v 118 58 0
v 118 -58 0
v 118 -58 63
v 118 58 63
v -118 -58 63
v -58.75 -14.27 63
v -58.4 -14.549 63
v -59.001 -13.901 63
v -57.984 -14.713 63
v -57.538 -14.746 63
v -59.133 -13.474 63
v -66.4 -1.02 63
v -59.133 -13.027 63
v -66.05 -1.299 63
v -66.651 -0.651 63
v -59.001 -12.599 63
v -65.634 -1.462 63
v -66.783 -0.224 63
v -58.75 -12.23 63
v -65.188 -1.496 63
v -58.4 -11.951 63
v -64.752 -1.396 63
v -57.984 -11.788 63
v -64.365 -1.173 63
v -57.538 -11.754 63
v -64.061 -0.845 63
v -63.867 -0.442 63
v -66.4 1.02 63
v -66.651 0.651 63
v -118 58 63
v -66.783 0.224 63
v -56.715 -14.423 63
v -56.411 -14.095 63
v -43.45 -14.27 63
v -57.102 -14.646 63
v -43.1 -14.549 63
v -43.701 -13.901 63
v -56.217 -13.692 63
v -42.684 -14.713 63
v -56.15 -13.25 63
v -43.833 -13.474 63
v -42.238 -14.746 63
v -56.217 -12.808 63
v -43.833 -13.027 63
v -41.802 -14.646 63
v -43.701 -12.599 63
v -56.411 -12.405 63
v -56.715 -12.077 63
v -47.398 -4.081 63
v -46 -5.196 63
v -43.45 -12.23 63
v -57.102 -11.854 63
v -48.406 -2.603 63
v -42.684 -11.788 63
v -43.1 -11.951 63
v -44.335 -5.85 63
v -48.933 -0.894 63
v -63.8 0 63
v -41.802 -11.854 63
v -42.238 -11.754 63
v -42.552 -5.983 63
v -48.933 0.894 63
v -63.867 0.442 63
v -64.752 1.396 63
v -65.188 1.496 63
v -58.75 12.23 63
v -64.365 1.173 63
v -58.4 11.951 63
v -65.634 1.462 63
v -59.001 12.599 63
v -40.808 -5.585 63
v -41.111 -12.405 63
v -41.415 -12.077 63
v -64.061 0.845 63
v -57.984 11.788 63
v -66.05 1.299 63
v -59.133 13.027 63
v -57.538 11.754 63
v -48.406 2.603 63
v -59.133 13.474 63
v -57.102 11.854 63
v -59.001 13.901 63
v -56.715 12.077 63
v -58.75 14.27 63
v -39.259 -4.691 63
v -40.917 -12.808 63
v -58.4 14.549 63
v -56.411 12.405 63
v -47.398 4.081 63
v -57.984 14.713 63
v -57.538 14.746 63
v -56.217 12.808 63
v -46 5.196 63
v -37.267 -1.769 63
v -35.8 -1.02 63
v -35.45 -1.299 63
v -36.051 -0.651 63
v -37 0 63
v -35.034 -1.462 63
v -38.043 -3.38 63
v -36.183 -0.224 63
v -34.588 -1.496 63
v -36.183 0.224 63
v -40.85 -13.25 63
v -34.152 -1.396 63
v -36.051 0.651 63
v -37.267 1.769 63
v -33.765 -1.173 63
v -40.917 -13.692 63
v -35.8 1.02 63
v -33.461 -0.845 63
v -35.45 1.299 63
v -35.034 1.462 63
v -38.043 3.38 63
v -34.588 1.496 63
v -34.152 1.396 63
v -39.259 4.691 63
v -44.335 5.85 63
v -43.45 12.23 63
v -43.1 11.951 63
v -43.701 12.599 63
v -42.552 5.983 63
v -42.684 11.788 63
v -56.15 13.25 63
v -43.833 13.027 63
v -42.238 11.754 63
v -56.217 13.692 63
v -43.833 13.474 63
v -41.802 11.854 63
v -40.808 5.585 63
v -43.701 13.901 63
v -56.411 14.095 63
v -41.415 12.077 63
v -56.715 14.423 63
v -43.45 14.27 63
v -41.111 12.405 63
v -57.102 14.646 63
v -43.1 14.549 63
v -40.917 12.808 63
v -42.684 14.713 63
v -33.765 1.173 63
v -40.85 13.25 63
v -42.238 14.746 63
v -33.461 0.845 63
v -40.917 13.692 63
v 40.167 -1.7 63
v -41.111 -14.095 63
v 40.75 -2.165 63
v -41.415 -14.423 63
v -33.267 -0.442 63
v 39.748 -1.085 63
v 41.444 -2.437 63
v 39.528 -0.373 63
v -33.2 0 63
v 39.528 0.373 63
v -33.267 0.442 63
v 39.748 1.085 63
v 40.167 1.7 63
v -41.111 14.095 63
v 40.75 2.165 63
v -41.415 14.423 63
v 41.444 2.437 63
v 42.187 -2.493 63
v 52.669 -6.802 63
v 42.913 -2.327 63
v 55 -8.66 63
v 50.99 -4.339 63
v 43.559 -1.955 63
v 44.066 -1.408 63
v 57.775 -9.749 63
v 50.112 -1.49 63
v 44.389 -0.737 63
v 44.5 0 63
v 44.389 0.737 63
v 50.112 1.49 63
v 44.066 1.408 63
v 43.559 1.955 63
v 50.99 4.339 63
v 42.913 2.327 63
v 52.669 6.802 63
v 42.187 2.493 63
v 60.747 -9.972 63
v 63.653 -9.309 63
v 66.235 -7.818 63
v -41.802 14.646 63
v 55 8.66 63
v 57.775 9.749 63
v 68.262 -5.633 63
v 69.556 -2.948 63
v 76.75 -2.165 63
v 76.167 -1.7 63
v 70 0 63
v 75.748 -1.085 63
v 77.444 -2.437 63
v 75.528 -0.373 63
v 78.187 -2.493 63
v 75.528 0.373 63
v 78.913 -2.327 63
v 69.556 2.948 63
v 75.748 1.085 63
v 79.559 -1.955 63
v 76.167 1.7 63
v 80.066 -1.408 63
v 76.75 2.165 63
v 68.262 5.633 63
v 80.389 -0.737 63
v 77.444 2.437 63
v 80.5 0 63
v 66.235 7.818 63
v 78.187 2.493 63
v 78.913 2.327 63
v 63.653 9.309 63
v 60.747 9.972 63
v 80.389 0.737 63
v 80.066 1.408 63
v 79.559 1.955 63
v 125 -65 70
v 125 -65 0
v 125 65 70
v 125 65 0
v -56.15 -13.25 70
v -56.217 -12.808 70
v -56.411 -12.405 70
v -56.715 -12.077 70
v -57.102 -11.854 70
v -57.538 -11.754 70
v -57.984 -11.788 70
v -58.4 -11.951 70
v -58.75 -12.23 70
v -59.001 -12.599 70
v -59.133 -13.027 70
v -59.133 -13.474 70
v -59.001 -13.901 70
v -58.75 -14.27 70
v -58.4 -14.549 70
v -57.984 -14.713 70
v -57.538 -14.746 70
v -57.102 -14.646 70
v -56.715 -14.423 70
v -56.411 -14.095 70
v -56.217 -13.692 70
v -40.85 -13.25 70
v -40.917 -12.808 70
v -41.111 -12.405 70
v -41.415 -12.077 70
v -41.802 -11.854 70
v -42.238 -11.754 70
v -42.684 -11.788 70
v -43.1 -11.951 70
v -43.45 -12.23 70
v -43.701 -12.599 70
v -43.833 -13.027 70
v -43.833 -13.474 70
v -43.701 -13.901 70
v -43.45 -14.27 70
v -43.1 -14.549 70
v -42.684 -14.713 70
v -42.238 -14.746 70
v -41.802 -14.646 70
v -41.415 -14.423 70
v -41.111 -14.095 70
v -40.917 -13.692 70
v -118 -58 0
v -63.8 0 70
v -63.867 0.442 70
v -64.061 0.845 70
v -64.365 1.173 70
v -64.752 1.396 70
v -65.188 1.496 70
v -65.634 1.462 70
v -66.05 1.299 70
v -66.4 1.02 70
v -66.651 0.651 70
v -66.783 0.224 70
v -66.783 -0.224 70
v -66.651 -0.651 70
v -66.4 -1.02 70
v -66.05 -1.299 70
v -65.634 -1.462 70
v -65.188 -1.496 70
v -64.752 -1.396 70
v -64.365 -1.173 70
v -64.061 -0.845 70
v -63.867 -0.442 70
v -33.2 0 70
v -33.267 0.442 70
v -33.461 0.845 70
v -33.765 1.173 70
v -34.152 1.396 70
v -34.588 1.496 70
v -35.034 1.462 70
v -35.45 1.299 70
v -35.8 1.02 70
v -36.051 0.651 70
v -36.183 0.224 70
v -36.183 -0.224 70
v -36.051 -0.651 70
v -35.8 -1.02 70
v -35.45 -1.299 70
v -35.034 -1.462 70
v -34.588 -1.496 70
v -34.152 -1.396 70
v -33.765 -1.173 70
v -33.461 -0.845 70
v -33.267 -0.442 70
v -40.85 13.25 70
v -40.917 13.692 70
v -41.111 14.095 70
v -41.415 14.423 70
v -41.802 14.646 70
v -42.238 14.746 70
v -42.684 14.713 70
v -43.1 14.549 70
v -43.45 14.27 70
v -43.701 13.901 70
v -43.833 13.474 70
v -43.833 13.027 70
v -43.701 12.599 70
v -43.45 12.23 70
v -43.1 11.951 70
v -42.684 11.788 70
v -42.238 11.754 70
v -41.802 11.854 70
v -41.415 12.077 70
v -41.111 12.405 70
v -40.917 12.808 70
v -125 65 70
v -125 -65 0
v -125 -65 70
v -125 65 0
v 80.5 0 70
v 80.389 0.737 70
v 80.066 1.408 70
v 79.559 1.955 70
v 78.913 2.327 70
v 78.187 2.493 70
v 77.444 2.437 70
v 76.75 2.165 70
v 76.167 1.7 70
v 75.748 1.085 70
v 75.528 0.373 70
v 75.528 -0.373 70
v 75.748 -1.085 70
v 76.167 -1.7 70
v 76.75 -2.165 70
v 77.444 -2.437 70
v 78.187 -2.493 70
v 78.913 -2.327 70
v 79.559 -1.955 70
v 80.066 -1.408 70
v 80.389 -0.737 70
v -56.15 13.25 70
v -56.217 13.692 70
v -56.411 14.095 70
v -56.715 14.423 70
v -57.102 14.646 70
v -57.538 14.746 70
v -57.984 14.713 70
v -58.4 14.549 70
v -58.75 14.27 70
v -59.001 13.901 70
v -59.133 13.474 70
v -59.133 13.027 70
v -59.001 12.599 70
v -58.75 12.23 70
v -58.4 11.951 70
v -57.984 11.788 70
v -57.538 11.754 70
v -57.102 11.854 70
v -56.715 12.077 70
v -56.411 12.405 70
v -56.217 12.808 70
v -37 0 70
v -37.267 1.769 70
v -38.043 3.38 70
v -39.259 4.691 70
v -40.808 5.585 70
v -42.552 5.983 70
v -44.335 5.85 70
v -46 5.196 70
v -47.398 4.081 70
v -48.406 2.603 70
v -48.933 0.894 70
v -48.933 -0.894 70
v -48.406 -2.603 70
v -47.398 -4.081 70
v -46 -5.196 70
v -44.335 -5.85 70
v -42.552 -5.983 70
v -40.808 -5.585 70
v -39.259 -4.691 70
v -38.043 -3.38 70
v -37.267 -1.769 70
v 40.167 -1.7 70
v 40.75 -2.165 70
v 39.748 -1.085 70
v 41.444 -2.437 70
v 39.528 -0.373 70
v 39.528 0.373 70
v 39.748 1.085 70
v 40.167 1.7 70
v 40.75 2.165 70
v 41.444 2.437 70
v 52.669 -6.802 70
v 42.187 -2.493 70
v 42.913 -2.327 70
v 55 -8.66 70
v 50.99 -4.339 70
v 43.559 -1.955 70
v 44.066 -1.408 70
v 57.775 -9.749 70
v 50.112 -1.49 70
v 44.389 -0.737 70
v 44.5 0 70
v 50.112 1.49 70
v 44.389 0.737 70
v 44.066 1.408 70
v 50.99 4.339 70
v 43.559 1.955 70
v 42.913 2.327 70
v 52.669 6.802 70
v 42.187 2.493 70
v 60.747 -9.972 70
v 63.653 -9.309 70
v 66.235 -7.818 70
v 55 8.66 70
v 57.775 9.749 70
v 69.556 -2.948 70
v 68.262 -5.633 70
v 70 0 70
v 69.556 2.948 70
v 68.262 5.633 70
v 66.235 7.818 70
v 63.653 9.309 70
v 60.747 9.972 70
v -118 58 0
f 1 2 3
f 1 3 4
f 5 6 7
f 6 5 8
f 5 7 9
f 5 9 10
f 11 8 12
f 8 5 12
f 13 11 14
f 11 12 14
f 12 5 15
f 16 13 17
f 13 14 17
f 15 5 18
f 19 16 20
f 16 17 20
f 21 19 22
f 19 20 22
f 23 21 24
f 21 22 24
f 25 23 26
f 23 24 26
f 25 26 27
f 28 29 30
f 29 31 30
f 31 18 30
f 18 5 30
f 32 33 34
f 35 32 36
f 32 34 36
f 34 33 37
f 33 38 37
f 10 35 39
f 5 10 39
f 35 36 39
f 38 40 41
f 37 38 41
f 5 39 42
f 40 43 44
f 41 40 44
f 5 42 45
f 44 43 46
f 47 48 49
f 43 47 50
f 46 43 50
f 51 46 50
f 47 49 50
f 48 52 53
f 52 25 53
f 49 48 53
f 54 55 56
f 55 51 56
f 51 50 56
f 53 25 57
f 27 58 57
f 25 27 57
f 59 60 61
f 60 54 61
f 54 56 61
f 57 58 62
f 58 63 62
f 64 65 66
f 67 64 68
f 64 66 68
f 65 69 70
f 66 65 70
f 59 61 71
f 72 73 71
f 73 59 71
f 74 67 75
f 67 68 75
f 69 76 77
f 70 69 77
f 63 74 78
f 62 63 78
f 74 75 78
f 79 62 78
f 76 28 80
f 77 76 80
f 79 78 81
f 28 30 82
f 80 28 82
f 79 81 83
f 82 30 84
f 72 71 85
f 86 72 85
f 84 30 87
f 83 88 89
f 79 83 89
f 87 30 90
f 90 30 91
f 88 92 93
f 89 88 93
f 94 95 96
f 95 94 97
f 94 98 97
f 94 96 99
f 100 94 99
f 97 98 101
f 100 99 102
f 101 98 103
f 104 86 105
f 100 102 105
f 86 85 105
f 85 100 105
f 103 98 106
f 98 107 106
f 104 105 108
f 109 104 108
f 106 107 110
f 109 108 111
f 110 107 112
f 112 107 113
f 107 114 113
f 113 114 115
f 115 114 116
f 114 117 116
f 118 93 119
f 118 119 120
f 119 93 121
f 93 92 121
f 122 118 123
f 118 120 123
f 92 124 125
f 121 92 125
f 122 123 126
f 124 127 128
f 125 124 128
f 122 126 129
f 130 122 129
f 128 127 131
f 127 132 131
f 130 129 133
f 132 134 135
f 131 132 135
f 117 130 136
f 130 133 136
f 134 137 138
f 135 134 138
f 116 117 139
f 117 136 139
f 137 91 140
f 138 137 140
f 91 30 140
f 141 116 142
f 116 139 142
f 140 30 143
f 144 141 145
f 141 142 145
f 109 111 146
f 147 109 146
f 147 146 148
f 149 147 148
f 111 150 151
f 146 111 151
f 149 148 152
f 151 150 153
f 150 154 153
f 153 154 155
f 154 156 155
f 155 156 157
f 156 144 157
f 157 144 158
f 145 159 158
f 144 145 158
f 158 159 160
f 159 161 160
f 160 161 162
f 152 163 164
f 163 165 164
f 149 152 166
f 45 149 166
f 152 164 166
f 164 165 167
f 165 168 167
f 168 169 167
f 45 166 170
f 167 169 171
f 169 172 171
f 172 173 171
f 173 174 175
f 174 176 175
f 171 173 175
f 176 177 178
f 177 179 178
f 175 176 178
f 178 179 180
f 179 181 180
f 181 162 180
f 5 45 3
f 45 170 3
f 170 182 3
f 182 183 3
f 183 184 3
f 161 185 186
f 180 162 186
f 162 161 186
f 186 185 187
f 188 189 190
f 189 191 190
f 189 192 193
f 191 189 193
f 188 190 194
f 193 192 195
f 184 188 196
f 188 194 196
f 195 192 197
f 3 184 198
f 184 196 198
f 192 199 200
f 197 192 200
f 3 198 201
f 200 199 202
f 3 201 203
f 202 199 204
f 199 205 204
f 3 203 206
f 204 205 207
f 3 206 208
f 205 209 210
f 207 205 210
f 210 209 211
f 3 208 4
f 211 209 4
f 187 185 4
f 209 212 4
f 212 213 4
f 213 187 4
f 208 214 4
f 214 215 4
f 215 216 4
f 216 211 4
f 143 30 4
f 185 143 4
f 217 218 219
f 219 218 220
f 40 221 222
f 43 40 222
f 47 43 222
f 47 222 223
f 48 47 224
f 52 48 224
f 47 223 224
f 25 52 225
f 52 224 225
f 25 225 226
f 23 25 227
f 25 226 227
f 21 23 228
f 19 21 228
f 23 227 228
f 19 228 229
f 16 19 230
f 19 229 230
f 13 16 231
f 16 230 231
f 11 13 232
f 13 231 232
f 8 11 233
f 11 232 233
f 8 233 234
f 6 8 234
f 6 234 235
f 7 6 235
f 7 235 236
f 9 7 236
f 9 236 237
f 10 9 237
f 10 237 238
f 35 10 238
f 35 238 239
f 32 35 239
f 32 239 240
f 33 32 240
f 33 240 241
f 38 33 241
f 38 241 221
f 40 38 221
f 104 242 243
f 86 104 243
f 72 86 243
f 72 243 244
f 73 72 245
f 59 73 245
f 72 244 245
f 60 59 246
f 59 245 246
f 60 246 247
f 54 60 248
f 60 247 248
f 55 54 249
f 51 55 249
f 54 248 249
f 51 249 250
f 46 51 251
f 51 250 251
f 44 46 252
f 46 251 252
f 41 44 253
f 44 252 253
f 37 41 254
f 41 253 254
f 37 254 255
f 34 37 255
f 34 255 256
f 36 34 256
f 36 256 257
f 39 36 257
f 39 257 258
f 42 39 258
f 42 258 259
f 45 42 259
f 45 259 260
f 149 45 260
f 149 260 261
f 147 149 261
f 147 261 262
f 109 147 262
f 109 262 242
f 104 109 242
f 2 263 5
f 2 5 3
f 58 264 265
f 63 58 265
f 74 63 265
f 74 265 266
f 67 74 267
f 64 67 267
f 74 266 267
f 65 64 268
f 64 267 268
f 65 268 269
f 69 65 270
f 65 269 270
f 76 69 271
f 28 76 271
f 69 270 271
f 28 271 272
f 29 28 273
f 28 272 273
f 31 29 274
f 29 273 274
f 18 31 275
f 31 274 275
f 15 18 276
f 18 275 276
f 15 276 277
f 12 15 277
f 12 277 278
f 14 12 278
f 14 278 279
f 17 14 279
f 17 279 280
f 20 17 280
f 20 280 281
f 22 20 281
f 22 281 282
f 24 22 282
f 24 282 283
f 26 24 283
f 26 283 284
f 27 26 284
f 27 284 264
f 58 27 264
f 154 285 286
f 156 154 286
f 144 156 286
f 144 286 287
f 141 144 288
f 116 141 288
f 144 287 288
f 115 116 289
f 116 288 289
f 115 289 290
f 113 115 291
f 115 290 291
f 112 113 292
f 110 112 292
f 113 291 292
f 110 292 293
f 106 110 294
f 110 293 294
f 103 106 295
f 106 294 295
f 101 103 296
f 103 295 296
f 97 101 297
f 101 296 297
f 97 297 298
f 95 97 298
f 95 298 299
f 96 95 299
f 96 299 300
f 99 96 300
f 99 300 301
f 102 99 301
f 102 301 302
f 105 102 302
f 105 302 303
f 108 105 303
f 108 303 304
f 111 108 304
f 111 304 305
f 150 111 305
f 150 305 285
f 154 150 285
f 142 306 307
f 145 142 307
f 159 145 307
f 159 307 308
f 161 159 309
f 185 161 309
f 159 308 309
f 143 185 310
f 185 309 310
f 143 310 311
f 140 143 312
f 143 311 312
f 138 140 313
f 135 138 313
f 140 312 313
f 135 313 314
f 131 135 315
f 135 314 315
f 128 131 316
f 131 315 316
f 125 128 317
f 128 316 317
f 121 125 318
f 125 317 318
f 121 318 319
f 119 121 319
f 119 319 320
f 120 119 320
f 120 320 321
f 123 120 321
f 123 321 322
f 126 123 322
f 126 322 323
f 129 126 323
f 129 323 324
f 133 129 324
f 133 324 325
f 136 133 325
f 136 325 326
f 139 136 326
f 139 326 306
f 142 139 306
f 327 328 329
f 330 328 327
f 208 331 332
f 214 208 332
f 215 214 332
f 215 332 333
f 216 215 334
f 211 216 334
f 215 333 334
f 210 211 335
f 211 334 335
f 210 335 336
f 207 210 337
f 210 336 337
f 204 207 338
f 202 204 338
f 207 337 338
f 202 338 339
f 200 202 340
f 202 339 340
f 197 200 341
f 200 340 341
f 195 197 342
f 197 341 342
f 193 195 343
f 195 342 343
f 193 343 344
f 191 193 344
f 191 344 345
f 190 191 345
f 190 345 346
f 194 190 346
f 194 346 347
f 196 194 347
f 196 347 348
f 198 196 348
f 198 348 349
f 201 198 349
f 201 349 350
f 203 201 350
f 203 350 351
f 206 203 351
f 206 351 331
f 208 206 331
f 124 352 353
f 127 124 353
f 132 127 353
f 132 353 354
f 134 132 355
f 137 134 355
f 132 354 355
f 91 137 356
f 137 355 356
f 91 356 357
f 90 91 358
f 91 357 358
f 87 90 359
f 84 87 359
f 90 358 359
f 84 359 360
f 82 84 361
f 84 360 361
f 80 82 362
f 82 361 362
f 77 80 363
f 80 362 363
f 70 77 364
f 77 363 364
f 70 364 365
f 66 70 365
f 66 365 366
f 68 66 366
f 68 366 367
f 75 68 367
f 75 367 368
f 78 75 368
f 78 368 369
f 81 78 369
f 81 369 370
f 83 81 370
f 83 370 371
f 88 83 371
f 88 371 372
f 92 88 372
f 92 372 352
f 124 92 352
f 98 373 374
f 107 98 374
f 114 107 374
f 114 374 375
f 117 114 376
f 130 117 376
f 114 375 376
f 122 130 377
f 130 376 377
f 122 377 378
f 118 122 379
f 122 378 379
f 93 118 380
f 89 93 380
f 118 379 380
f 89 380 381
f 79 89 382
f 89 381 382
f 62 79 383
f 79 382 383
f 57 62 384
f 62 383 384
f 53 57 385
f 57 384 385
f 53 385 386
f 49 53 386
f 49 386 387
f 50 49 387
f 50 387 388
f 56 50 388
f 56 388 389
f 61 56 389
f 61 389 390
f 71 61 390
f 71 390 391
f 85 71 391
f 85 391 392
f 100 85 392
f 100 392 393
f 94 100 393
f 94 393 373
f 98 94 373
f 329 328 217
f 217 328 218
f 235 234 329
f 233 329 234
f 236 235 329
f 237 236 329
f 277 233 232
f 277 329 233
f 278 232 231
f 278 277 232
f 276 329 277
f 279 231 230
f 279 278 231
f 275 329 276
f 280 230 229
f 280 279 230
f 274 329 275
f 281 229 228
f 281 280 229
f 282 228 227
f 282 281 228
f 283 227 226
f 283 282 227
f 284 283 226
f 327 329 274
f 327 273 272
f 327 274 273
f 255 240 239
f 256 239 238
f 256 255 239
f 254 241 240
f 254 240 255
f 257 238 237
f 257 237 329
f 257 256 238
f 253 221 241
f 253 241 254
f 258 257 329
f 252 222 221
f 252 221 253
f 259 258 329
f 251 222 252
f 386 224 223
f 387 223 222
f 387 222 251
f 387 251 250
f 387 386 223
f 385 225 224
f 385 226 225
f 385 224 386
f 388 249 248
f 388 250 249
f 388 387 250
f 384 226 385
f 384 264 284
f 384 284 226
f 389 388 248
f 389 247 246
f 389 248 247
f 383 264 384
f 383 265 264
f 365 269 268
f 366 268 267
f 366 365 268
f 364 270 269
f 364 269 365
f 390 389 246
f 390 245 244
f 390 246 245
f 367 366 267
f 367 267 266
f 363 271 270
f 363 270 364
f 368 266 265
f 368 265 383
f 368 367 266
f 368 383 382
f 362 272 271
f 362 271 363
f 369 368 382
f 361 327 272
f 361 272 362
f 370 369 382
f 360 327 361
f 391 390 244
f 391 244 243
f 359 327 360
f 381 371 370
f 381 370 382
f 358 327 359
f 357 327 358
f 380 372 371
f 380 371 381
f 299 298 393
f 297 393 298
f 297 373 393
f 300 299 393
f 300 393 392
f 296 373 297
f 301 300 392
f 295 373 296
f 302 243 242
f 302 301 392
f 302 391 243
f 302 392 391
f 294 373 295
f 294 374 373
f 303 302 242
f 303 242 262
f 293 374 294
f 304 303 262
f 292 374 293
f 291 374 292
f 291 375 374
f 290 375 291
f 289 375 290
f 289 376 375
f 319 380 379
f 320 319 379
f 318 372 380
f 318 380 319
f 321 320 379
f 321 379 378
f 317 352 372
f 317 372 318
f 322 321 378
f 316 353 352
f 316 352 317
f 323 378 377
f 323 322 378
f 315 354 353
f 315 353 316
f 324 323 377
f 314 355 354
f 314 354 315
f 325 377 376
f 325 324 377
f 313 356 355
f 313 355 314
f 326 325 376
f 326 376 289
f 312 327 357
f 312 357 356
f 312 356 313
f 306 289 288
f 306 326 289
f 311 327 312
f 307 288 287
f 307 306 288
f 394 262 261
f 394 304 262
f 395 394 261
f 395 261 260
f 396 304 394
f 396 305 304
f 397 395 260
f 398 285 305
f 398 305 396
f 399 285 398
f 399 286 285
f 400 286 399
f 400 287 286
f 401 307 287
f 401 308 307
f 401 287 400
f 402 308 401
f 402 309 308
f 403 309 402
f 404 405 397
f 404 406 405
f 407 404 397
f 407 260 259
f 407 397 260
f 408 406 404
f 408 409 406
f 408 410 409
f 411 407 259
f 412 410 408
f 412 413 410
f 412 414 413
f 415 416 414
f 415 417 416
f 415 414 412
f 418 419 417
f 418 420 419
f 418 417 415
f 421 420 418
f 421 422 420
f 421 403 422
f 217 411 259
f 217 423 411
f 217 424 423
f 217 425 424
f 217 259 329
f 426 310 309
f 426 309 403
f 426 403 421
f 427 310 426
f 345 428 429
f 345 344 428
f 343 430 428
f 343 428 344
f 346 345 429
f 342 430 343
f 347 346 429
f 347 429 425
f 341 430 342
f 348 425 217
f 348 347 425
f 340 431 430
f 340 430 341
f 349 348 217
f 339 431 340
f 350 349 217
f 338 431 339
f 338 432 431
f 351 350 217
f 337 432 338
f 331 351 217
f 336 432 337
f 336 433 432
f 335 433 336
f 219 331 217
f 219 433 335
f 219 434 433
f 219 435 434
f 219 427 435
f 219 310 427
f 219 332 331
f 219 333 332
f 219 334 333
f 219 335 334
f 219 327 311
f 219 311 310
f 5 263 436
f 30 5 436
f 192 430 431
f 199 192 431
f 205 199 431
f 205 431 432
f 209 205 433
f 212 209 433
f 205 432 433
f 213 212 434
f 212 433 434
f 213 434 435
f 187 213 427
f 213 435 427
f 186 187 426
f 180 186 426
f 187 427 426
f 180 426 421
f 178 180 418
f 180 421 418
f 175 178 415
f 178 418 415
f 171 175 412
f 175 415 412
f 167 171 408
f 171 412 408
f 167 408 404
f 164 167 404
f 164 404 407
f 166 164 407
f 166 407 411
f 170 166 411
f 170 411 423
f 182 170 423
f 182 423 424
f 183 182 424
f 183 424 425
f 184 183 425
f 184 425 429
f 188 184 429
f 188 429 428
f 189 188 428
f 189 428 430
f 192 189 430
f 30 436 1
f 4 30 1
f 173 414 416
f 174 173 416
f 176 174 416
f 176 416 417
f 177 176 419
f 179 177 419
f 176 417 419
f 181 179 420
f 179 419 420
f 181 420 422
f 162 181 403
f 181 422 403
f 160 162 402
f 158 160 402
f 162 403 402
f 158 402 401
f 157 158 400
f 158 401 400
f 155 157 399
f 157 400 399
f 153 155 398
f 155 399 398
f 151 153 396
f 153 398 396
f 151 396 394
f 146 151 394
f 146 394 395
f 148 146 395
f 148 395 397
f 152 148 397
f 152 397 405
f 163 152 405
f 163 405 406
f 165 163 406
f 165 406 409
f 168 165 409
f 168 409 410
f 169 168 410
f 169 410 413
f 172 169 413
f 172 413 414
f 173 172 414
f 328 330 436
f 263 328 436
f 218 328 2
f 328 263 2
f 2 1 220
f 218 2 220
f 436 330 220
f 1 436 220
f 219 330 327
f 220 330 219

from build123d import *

# Parameters (mm, degrees)
SKETCH1_W           = 250
SKETCH1_H           = 130
BOSS_EXTRUDE1_DEPTH = 70
SHELL1_T            = -7
SKETCH2_R           = 10
SKETCH2_R_2         = 2.5
SKETCH2_R_3         = 1.5
SKETCH2_R_4         = 6
CUT_EXTRUDE1_DEPTH  = 90


with BuildPart() as part:
    # Sketch1 → Boss-Extrude1 (new body)
    with BuildSketch(Plane.XY):
        Rectangle(SKETCH1_W, SKETCH1_H)
    extrude(amount=BOSS_EXTRUDE1_DEPTH)

    # Shell1
    shell1_openings = [part.faces().sort_by_distance(p)[0] for p in [
        (0, 0, 0),
    ]]
    offset(amount=SHELL1_T, openings=shell1_openings, kind=Kind.INTERSECTION)

    # Sketch2 → Cut-Extrude1 (cut)
    with BuildSketch(Plane.XY.offset(70)):
        with Locations((60, 0)):
            Circle(SKETCH2_R)
        with Locations((42, 0)):
            Circle(SKETCH2_R_2)
        with Locations((78, 0)):
            Circle(SKETCH2_R_2)
        with Locations((-34.7, 0)):
            Circle(SKETCH2_R_3)
        with Locations((-42.35, -13.250188678)):
            Circle(SKETCH2_R_3)
        with Locations((-57.65, -13.250188678)):
            Circle(SKETCH2_R_3)
        with Locations((-65.3, 0)):
            Circle(SKETCH2_R_3)
        with Locations((-57.65, 13.250188678)):
            Circle(SKETCH2_R_3)
        with Locations((-42.35, 13.250188678)):
            Circle(SKETCH2_R_3)
        with Locations((-43, 0)):
            Circle(SKETCH2_R_4)
    extrude(amount=-CUT_EXTRUDE1_DEPTH, mode=Mode.SUBTRACT)


solid = part.part
